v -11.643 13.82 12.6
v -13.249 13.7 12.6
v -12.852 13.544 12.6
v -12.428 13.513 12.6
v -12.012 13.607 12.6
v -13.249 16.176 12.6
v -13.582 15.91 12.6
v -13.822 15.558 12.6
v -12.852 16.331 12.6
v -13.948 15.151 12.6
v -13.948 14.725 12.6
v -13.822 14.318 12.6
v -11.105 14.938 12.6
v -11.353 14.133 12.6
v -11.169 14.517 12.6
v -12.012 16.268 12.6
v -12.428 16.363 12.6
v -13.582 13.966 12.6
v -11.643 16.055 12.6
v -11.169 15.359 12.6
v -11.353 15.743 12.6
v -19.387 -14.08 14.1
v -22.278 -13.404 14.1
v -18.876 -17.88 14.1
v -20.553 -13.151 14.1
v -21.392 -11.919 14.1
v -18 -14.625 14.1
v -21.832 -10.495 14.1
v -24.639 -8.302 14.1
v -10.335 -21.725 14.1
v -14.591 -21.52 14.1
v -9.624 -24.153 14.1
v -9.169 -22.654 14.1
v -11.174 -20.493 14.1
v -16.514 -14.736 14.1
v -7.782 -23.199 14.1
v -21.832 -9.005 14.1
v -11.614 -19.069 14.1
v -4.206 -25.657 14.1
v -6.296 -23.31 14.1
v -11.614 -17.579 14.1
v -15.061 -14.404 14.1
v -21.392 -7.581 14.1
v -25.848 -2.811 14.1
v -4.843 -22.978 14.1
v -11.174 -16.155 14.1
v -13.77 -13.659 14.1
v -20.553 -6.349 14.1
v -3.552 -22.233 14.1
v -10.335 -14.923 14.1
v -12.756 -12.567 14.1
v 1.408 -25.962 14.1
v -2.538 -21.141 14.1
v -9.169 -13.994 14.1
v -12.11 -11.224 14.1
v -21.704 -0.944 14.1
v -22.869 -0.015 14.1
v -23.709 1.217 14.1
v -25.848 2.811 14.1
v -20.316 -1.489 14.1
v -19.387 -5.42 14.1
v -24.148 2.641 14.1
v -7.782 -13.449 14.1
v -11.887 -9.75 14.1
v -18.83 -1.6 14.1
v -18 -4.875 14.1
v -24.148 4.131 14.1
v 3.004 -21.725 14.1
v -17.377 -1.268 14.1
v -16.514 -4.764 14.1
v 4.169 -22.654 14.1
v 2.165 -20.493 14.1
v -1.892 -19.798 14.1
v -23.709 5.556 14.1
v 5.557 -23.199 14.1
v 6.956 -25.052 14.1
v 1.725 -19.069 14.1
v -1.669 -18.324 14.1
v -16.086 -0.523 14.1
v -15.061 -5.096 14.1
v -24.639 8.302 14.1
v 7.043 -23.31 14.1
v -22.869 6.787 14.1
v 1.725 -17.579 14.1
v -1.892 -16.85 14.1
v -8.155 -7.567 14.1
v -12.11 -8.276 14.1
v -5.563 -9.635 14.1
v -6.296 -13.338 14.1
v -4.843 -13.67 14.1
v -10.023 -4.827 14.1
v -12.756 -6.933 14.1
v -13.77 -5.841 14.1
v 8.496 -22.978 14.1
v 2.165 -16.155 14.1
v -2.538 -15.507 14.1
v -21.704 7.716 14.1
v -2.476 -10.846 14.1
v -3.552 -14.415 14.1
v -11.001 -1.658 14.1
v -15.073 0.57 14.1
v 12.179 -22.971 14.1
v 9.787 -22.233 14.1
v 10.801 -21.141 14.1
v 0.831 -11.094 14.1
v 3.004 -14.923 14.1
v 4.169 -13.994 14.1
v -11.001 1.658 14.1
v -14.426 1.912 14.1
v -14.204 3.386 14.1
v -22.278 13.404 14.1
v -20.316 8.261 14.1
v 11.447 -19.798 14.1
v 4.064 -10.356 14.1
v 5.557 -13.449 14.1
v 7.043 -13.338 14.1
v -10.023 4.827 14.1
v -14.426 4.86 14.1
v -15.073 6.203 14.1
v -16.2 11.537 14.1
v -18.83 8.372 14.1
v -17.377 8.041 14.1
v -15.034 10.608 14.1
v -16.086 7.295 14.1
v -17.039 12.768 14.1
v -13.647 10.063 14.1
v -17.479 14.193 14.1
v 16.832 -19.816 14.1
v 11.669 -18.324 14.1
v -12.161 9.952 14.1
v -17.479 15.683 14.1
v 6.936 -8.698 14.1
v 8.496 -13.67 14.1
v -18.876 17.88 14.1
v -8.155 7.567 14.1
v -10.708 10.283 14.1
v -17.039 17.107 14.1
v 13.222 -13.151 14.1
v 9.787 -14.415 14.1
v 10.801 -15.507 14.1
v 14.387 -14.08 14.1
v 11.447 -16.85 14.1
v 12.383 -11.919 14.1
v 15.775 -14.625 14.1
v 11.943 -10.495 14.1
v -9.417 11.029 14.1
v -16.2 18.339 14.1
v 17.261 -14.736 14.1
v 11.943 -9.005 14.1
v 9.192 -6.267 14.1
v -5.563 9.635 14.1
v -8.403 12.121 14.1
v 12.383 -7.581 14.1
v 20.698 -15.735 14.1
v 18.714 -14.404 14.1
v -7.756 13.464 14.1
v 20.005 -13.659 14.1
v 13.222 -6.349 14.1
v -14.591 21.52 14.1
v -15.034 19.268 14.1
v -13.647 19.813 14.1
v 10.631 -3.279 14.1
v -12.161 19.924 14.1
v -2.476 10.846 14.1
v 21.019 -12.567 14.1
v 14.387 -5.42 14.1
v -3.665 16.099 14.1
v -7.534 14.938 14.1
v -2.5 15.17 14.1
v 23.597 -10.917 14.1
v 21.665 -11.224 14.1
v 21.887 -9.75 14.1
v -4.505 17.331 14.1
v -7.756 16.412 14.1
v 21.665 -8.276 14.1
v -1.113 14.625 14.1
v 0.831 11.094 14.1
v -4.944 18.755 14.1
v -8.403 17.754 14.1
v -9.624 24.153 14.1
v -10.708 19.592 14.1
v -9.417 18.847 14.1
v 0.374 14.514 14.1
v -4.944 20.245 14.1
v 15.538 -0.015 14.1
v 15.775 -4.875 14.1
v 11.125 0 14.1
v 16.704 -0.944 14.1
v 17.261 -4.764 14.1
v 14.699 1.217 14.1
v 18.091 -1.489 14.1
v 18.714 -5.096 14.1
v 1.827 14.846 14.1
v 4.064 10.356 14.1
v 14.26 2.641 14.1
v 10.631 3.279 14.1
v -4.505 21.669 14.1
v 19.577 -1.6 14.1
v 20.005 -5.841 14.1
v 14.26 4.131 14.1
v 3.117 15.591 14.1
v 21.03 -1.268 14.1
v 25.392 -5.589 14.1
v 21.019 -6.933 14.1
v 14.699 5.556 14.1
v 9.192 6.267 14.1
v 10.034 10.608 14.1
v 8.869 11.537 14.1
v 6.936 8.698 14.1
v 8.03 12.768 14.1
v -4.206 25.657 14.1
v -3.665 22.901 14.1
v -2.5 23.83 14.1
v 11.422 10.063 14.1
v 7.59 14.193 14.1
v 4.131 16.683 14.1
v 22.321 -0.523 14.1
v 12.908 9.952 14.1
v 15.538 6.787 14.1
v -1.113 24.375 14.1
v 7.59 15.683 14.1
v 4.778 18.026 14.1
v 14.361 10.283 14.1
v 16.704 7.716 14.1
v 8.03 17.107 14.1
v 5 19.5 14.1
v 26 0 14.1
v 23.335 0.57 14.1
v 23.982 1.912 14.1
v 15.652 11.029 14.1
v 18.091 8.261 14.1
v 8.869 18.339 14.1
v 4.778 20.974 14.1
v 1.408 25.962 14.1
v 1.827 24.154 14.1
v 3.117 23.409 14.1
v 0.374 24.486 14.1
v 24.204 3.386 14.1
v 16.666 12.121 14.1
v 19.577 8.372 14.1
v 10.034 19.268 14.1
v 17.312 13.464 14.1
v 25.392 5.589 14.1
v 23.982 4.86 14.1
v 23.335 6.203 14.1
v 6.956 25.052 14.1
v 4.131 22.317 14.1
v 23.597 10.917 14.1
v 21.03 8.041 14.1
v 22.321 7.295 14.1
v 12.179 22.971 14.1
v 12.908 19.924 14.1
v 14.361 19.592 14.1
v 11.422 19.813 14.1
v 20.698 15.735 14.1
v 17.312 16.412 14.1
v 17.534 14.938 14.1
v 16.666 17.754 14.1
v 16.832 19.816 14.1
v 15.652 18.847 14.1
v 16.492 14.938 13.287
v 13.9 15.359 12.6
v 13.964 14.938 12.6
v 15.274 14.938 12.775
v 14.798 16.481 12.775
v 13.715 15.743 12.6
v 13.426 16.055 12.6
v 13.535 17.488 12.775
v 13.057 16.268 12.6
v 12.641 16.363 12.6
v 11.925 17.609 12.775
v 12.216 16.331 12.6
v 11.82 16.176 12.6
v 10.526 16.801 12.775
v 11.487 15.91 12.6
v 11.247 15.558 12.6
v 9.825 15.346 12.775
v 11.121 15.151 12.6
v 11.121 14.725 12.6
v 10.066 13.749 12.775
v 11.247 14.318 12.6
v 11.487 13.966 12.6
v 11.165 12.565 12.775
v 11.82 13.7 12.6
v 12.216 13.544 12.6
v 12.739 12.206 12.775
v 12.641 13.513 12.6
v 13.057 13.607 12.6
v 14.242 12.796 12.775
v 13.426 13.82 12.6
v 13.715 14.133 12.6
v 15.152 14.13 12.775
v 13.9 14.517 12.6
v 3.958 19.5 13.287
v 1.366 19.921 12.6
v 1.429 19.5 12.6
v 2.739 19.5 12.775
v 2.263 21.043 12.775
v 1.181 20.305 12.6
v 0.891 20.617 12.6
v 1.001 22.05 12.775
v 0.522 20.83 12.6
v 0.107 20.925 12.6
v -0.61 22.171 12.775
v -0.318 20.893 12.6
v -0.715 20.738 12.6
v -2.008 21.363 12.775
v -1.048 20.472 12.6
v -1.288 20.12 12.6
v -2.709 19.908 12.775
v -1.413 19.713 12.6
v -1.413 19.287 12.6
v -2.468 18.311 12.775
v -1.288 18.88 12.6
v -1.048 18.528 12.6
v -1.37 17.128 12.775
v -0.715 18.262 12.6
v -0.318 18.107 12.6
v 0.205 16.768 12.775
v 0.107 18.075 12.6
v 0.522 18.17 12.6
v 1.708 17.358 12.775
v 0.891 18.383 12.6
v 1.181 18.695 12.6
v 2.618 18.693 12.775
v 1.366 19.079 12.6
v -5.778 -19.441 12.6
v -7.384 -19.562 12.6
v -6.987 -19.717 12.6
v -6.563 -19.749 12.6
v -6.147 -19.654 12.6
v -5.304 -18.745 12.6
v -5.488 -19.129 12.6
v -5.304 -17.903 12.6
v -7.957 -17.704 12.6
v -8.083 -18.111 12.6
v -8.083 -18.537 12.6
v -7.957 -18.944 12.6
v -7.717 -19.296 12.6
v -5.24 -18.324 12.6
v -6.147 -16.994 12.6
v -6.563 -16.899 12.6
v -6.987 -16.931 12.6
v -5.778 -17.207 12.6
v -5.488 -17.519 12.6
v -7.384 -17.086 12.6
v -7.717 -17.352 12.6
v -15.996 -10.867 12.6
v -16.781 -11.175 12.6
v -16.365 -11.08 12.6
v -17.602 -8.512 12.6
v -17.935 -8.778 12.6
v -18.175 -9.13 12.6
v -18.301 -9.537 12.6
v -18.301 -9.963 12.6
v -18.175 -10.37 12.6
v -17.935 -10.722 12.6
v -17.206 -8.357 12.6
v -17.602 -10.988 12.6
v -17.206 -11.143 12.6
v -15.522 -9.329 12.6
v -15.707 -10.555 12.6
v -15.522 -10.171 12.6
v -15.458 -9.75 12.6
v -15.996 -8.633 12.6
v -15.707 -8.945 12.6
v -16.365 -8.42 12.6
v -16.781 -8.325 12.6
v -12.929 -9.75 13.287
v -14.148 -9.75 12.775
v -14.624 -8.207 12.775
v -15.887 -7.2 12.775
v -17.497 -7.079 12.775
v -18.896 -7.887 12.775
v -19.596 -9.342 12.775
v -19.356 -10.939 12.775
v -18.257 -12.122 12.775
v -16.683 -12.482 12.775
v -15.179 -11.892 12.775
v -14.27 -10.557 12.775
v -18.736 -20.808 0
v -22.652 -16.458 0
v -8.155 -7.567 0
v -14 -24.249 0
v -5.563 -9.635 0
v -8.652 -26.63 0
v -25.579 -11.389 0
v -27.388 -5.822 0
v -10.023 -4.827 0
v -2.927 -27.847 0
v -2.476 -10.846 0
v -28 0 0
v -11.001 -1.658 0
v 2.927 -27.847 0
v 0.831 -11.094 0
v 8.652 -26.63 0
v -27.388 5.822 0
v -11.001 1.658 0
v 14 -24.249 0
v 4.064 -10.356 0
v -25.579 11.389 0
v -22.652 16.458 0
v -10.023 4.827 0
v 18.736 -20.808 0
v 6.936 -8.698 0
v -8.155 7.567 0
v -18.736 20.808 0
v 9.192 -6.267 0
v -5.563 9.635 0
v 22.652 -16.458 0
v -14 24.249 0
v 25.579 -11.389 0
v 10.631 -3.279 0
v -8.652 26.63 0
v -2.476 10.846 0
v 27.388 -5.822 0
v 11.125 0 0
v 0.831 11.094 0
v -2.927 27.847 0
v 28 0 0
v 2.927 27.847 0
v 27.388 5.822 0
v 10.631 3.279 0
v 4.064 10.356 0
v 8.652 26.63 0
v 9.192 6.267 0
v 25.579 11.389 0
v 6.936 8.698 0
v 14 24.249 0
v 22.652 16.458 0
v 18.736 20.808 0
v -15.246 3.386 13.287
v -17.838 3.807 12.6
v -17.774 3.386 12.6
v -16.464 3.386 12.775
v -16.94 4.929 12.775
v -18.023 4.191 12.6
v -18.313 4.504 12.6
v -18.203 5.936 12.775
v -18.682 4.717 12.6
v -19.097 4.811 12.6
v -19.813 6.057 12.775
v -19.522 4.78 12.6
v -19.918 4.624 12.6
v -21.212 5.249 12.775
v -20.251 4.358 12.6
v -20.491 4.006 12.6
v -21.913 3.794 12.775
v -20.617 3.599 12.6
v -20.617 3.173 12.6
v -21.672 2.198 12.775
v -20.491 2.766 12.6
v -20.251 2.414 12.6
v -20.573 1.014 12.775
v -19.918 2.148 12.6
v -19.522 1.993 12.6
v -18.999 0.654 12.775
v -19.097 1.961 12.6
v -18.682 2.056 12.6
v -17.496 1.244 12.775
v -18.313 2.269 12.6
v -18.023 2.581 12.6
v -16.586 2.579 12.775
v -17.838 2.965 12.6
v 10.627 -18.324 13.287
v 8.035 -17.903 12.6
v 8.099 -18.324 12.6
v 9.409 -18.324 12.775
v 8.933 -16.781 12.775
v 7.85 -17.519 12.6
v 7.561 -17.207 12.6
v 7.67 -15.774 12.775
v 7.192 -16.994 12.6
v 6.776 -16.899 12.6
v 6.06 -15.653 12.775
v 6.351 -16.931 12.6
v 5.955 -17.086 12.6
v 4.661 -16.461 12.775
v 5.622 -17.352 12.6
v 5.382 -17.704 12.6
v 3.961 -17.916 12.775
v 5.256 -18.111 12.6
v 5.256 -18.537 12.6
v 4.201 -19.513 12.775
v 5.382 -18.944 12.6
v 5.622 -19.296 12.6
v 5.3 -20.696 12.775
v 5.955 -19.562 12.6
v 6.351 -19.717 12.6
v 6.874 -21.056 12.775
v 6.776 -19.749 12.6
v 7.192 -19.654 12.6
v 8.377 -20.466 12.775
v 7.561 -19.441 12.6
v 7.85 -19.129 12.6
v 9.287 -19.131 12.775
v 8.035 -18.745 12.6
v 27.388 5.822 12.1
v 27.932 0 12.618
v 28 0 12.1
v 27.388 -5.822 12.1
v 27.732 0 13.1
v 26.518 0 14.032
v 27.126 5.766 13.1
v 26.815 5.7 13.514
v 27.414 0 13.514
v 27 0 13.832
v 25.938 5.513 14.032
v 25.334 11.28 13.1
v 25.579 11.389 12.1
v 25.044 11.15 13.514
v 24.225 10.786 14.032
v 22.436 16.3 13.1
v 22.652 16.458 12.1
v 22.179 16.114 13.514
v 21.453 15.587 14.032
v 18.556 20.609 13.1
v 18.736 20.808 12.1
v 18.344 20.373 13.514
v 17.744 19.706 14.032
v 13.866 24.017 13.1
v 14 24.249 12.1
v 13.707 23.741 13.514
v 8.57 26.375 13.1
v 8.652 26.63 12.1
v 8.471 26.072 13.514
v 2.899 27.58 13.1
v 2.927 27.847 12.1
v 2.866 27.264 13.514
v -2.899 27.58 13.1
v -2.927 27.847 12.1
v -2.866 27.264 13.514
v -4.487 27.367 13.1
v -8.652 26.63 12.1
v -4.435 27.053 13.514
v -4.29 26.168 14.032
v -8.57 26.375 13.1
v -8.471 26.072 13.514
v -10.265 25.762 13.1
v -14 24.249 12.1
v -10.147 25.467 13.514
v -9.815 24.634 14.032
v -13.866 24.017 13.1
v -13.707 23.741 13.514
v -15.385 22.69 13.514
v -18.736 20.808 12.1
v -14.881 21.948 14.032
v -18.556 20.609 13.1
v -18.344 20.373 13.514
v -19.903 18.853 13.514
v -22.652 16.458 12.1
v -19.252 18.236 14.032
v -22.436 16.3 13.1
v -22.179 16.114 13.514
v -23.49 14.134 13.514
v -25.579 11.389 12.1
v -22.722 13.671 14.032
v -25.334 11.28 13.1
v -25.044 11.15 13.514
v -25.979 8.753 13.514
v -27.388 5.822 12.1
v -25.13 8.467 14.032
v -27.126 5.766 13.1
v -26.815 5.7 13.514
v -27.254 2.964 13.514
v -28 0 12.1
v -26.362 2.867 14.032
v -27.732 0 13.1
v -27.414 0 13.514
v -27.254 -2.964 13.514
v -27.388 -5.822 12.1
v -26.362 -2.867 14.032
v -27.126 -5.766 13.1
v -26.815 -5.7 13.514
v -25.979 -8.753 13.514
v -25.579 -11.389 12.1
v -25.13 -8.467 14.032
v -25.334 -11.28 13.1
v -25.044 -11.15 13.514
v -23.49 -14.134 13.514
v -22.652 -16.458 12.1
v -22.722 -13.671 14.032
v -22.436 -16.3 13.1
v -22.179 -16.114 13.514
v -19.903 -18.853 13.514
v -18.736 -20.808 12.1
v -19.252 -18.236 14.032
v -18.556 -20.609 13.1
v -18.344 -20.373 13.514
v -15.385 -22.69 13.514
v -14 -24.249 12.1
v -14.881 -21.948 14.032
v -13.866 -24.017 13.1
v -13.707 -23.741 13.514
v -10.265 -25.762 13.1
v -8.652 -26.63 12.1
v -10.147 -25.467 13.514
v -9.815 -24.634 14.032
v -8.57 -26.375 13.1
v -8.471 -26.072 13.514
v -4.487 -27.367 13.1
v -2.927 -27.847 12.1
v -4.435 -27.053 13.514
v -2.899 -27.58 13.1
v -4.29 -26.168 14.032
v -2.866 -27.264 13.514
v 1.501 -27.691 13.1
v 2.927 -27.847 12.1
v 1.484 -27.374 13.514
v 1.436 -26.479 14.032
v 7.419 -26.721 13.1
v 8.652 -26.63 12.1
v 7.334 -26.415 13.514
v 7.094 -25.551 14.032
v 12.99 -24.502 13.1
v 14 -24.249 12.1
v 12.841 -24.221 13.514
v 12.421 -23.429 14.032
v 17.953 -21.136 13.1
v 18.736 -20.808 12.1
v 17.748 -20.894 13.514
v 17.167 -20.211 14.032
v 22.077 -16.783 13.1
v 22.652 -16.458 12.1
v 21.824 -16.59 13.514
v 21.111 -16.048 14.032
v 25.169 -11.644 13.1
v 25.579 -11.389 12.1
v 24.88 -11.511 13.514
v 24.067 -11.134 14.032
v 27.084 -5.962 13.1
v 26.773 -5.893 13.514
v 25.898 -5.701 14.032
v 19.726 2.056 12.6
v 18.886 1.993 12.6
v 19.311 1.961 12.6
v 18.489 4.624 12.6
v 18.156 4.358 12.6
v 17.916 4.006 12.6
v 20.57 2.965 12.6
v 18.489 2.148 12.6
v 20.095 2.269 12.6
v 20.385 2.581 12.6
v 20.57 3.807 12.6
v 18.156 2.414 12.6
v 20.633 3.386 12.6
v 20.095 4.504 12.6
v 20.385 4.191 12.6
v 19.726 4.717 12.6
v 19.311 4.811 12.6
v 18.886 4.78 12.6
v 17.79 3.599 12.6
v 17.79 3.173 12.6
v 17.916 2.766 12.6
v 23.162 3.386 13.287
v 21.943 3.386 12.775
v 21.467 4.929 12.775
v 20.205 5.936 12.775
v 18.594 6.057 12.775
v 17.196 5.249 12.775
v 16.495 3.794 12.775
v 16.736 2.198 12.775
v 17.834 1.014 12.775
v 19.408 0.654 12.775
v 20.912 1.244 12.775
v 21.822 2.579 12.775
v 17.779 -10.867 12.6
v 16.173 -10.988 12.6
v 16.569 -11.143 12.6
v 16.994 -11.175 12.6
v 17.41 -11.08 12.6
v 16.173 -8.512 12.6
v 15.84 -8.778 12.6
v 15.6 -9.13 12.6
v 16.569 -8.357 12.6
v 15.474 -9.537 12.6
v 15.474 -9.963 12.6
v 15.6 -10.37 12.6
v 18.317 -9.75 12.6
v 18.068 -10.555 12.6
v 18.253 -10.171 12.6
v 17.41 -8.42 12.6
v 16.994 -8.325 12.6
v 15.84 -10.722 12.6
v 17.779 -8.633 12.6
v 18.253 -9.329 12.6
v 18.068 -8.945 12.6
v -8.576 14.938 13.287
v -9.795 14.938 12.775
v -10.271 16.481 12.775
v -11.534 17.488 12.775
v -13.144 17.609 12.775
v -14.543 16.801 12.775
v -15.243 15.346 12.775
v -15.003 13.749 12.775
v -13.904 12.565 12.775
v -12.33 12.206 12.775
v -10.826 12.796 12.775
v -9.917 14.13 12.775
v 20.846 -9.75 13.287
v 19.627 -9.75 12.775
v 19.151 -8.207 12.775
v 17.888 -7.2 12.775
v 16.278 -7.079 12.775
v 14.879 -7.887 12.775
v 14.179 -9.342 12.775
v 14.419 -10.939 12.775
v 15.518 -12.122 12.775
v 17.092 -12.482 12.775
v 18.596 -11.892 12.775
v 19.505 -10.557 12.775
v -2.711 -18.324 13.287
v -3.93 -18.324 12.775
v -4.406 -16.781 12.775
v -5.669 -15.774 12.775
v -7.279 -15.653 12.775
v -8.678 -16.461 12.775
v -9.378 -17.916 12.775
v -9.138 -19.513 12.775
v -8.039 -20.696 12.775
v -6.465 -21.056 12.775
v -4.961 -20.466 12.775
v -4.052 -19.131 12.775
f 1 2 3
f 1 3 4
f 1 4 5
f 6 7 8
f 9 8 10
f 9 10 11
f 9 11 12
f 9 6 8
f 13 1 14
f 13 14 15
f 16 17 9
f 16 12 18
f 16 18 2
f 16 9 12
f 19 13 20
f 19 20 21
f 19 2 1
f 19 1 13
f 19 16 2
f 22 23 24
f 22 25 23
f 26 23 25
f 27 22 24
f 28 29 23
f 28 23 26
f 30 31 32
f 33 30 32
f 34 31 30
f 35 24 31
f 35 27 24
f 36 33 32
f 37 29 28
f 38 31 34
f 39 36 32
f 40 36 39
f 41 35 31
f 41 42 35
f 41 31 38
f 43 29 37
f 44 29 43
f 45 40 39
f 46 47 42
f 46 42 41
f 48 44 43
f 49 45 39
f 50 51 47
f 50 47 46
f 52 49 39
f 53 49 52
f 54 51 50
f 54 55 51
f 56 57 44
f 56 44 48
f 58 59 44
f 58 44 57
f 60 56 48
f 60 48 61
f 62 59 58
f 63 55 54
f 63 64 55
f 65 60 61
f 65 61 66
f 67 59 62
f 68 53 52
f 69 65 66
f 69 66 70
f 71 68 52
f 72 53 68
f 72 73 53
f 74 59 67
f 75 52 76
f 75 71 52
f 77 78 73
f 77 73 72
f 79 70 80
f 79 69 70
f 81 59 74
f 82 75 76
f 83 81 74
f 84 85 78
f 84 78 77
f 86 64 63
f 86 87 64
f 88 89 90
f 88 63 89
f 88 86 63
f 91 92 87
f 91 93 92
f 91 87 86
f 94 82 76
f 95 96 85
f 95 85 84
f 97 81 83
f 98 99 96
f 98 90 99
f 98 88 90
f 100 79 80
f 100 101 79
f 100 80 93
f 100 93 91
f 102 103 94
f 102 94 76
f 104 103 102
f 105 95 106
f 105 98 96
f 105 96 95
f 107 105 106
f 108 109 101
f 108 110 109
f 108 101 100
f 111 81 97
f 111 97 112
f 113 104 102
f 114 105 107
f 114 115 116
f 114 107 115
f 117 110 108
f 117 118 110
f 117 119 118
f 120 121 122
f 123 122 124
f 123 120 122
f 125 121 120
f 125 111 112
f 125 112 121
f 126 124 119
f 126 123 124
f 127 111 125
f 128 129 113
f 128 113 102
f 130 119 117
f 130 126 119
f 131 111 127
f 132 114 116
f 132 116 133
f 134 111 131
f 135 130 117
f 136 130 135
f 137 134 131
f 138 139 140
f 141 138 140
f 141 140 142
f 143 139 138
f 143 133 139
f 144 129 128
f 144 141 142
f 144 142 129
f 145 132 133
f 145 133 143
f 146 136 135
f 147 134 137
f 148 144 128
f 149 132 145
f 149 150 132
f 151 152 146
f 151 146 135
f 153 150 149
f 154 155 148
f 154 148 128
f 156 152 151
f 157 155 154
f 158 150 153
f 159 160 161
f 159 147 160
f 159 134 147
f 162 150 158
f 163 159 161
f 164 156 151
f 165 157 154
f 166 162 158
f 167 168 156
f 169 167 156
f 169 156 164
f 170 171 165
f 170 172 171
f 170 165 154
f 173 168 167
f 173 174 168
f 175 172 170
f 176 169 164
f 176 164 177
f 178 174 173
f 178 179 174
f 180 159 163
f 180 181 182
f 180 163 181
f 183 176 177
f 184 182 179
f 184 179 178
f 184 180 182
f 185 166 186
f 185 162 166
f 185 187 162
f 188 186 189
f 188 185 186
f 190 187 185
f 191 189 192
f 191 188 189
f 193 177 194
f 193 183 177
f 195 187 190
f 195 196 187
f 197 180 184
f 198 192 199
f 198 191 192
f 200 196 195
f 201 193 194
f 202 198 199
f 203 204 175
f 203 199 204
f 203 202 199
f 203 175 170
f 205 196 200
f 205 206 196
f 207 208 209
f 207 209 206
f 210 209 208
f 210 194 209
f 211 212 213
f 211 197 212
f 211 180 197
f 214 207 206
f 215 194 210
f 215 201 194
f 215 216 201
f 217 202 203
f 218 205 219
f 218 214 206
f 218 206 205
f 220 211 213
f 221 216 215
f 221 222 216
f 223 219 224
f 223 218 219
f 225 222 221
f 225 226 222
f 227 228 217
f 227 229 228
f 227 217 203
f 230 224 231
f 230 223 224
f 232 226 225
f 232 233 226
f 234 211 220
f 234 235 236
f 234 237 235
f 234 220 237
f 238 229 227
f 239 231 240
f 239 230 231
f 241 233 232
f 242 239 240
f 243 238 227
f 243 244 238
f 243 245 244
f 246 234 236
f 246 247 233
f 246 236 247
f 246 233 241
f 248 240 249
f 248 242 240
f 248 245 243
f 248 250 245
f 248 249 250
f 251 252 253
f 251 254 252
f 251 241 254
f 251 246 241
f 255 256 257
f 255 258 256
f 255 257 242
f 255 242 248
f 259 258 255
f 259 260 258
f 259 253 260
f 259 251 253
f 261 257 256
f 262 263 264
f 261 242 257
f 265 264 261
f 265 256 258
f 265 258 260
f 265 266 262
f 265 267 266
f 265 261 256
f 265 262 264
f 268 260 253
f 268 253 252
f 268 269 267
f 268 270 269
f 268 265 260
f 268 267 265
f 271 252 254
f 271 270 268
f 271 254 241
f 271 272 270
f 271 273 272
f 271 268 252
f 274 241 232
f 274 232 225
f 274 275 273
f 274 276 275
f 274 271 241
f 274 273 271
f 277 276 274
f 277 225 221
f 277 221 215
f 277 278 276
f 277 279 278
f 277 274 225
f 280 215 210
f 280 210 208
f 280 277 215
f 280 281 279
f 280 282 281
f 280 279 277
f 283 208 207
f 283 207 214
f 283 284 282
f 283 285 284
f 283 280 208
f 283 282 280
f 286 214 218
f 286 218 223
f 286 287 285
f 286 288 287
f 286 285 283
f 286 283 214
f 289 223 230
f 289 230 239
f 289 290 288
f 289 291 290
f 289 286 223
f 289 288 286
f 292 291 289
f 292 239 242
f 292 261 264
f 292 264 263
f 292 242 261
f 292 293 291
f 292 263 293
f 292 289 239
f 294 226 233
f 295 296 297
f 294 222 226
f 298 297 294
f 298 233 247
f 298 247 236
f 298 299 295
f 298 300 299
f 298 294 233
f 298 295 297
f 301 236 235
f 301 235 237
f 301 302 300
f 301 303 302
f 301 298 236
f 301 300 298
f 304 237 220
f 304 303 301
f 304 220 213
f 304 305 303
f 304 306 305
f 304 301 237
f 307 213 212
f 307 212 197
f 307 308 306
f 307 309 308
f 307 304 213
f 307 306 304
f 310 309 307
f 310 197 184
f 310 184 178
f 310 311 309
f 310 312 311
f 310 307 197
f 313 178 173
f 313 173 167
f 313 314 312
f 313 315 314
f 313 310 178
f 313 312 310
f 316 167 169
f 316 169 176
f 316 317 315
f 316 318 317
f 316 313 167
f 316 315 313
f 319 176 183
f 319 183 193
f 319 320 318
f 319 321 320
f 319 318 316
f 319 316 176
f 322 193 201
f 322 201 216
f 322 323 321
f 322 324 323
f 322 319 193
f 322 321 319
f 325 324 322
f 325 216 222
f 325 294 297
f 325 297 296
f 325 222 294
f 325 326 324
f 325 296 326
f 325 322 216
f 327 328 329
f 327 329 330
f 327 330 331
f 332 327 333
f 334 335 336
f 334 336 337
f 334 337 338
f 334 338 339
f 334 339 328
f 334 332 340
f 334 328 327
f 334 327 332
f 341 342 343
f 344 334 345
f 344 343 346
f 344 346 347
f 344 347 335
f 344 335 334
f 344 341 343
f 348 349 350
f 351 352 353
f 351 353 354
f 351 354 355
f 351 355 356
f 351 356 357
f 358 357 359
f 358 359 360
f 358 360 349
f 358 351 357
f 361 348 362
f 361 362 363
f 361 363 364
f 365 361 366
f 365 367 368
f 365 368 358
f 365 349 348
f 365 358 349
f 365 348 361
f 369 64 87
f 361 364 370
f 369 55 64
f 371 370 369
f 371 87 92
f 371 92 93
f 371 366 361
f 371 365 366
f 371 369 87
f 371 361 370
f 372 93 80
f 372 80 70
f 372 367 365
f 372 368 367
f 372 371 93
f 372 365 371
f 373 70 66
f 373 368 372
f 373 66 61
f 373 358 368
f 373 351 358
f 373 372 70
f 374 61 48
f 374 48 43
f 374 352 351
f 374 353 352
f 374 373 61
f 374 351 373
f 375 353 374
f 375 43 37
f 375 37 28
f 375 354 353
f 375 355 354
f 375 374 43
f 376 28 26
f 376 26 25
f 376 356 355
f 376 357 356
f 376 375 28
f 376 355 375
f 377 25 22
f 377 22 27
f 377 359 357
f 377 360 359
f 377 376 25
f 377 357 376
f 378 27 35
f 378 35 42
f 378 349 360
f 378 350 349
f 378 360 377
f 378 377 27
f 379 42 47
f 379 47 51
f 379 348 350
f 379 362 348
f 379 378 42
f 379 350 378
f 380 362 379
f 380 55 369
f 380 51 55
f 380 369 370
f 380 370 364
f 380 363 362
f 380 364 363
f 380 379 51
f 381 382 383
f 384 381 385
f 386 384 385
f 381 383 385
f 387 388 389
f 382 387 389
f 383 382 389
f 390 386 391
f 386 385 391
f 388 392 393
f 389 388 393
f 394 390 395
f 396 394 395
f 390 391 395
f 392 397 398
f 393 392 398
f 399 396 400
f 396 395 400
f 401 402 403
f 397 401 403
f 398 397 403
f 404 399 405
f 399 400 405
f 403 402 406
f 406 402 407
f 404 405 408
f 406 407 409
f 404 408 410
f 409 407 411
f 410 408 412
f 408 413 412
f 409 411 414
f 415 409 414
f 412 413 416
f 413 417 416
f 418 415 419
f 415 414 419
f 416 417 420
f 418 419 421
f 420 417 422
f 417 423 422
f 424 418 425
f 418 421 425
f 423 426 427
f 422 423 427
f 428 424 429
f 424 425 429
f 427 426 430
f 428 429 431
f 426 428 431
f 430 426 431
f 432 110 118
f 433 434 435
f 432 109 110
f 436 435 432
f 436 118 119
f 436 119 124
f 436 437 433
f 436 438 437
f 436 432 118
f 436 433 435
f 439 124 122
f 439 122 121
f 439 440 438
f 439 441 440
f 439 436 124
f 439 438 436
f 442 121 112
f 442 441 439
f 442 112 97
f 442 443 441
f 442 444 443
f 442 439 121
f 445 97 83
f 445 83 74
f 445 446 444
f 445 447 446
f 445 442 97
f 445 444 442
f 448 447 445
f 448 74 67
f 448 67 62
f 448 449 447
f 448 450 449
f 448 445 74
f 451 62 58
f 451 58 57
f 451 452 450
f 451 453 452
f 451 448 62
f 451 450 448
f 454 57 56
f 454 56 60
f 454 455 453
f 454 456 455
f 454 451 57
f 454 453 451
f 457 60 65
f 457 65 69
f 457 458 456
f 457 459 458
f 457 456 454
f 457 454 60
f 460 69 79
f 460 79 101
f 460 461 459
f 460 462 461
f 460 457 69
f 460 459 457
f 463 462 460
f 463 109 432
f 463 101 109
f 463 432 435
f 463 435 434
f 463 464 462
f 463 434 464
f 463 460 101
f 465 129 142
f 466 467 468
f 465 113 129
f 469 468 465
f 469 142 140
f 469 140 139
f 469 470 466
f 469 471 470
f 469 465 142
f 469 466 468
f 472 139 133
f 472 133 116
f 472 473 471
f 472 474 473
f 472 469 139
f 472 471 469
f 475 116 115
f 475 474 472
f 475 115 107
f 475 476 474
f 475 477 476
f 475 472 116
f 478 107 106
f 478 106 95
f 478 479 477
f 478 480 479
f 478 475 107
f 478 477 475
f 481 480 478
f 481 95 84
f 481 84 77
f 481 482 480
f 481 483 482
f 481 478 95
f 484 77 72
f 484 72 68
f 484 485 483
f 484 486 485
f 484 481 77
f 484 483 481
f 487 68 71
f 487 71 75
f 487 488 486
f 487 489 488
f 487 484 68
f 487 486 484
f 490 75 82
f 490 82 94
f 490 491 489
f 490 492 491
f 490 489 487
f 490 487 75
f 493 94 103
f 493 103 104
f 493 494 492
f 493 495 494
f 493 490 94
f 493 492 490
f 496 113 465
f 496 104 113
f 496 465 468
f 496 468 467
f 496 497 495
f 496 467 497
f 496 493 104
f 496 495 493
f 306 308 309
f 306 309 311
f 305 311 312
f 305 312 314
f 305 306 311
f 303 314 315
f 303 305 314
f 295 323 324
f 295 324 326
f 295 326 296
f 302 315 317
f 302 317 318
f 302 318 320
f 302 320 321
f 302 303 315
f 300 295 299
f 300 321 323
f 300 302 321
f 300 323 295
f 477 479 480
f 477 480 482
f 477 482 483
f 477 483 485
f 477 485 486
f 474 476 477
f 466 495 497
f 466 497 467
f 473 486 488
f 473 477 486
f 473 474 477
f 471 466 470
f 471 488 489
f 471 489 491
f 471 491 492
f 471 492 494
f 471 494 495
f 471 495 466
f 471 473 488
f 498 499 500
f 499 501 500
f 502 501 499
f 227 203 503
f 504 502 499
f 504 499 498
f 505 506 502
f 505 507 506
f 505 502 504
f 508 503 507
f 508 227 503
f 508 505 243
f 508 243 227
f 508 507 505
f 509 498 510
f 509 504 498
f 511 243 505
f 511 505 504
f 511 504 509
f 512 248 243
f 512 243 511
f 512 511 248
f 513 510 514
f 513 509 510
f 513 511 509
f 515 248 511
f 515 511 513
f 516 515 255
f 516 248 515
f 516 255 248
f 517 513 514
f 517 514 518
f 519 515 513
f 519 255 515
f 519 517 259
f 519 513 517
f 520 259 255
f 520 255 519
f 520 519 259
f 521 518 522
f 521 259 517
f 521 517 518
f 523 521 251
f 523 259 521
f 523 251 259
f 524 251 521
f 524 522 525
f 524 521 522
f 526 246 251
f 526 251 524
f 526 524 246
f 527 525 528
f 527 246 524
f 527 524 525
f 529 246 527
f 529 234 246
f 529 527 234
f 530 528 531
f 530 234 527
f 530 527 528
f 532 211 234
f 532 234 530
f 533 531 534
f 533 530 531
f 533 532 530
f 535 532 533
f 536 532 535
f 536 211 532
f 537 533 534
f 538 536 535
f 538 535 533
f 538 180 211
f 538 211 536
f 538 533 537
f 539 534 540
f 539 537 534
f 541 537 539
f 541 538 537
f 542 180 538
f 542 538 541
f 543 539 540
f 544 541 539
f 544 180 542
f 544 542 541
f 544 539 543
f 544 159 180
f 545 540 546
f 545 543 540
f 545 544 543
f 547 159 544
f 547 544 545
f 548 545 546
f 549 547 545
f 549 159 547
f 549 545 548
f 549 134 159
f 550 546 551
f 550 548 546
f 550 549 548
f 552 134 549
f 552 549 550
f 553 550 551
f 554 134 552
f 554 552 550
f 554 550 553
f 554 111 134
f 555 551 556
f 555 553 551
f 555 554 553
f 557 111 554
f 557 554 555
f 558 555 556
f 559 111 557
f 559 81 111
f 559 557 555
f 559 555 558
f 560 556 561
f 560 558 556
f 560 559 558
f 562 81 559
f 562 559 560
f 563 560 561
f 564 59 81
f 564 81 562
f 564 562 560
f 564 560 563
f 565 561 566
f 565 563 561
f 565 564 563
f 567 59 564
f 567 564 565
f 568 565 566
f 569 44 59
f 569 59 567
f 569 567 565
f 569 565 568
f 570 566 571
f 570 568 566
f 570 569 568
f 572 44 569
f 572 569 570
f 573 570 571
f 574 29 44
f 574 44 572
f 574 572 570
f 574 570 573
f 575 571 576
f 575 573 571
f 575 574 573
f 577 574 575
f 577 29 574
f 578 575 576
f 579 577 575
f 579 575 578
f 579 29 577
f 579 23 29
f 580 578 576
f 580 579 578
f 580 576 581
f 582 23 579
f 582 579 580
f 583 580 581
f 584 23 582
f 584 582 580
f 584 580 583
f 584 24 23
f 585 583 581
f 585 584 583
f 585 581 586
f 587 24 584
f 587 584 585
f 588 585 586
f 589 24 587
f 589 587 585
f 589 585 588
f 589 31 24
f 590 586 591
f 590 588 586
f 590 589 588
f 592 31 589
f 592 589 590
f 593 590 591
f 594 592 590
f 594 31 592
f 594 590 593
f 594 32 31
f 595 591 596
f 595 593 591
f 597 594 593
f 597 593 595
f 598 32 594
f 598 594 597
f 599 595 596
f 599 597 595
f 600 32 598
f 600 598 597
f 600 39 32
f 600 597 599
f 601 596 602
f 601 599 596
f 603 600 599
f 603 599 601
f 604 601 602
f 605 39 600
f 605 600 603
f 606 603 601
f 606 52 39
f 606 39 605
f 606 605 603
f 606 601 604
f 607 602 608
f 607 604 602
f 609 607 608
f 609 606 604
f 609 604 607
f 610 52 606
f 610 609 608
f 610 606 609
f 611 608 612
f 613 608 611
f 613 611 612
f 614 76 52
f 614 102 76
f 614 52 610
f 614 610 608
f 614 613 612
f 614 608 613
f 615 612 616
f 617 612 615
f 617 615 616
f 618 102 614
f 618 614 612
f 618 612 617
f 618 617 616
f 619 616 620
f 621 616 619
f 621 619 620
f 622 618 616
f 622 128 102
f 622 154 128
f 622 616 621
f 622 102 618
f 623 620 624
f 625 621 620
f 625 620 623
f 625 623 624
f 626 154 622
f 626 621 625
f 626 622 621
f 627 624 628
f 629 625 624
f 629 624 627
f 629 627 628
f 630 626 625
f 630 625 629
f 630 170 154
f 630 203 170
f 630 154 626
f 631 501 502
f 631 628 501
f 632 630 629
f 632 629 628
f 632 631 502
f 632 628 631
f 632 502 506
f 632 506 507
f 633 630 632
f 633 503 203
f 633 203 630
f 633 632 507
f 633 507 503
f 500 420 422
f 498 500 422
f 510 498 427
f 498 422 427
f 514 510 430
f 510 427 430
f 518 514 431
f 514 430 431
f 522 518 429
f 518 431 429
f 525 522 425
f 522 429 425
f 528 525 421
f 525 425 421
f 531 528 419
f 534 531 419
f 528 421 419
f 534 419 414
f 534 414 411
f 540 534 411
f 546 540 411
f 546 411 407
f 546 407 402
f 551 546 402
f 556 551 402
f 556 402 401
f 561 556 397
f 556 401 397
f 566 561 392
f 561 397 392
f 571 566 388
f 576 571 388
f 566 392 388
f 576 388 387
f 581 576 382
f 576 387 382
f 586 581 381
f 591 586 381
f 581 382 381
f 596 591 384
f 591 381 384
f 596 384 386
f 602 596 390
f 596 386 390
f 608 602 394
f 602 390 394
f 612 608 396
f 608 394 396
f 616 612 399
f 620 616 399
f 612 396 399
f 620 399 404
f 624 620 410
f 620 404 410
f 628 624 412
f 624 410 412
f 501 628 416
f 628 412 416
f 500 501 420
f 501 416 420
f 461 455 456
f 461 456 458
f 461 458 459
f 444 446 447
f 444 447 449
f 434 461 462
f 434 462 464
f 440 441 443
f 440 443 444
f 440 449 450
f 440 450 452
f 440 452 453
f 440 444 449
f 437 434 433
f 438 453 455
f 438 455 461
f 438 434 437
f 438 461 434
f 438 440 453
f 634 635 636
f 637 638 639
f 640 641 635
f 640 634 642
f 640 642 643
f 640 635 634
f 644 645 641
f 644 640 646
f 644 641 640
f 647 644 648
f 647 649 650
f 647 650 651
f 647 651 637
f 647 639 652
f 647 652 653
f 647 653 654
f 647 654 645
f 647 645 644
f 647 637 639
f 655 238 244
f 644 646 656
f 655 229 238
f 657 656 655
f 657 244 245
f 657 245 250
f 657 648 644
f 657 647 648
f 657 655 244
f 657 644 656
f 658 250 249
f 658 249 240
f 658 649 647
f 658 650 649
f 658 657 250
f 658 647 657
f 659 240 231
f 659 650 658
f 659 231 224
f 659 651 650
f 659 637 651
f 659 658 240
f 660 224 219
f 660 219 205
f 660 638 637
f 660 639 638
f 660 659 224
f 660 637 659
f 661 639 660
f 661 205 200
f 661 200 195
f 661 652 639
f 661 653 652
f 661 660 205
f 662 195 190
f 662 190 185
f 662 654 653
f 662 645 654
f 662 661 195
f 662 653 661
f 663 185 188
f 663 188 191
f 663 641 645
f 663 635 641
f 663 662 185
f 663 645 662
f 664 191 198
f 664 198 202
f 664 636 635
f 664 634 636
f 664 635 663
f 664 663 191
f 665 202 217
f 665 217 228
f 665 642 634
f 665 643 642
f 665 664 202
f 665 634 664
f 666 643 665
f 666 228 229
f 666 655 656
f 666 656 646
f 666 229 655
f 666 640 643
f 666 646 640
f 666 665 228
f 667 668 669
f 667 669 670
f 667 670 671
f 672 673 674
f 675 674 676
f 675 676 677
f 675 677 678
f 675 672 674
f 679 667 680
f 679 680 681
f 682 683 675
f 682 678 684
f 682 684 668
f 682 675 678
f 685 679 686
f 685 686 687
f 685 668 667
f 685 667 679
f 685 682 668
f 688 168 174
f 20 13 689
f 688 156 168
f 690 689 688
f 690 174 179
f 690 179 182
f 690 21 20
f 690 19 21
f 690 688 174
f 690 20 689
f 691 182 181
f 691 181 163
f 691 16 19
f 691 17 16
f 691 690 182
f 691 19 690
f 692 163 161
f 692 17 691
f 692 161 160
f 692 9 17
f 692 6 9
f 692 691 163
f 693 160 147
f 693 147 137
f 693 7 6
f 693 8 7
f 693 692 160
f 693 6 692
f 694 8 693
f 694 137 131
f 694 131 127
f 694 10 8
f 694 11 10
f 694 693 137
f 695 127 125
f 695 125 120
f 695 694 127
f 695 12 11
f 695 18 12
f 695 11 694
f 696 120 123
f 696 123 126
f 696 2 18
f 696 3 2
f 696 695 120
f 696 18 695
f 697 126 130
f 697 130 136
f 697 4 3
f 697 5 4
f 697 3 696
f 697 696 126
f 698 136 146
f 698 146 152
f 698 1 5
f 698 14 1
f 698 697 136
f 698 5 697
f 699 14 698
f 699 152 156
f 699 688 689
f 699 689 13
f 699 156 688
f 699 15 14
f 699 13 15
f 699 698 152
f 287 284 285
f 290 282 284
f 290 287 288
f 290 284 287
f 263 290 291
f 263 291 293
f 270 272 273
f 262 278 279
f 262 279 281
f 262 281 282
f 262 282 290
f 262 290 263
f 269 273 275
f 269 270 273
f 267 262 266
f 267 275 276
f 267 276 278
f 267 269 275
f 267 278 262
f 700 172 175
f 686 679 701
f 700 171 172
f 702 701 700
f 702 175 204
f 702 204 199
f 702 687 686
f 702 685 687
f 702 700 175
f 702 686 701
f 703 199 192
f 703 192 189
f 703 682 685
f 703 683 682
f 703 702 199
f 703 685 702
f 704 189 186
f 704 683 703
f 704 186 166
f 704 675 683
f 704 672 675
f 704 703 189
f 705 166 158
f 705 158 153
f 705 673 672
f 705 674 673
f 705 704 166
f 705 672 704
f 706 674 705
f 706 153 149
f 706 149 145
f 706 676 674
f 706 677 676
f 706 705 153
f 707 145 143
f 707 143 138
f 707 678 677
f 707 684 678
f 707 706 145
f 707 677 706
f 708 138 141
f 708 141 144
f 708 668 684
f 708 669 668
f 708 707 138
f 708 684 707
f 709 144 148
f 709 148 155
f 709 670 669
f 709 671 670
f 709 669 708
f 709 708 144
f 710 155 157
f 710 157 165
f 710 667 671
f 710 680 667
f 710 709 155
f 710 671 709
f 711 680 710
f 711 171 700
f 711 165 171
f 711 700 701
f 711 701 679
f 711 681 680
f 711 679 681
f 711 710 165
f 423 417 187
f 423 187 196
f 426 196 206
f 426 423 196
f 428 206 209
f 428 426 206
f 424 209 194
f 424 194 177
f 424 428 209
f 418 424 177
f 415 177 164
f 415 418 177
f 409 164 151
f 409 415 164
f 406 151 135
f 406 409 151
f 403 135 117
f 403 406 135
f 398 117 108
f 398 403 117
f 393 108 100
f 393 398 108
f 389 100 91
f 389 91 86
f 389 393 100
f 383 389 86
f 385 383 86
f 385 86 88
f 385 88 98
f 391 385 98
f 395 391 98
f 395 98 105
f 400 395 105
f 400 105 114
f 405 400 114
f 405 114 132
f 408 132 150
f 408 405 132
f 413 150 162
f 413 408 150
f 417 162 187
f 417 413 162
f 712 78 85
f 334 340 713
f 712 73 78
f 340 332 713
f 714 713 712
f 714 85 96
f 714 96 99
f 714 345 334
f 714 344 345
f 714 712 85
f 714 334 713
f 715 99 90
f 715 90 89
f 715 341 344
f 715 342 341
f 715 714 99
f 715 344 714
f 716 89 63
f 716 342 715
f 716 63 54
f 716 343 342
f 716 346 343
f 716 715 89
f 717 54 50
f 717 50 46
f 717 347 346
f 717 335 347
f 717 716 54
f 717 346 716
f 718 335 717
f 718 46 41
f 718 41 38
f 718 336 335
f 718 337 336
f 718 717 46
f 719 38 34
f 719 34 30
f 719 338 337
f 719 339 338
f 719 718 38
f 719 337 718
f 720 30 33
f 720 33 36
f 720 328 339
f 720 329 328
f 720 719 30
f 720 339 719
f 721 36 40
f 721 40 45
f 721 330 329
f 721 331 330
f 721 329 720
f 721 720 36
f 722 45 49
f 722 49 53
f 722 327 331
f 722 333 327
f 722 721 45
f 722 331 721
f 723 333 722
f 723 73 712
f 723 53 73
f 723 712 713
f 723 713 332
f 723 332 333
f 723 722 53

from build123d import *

# Parameters (mm, degrees)
F0_R     = 28
F0_R_2   = 11.125
F1_DEPTH = 14.1
F2_R     = 2
F3_R     = 5
F4_DEPTH = 1.5


# Not quite as in the source:
# - a fillet or chamfer that OpenCascade refuses, or shapes differently, is made with other operations: its cross-section is extruded or revolved along the edge and cut away or added


with BuildPart() as f1:
    # F0 (on Top) → F1 (new body)
    with BuildSketch(Plane.XY):
        Circle(F0_R)
        Circle(F0_R_2, mode=Mode.SUBTRACT)
    extrude(amount=F1_DEPTH)

    # F2
    f2_edges = [f1.edges().sort_by_distance(p)[0] for p in [
        (-28, 0, 14.1),
    ]]
    fillet(f2_edges, radius=F2_R)

    # F3 (on face) → F4 (cut)
    with BuildSketch(Plane.XY.offset(14.1)):
        with Locations((0, 19.5)):
            Circle(F3_R)
        with Locations((-12.5343583889, 14.9378666408)):
            Circle(F3_R)
        with Locations((-19.2037511837, 3.3861394645)):
            Circle(F3_R)
        with Locations((-16.8874953738, -9.75)):
            Circle(F3_R)
        with Locations((-6.6693927949, -18.3240061053)):
            Circle(F3_R)
        with Locations((6.6693927949, -18.3240061053)):
            Circle(F3_R)
        with Locations((16.8874953738, -9.75)):
            Circle(F3_R)
        with Locations((19.2037511837, 3.3861394645)):
            Circle(F3_R)
        with Locations((12.5343583889, 14.9378666408)):
            Circle(F3_R)
    extrude(amount=-F4_DEPTH, mode=Mode.SUBTRACT)

    # F5: fillet of radius 5 on 9 edges, made by hand

    # F5_s1 → F5_t2 (revolve)
    with BuildSketch(Plane.XZ.offset(-19.5)):
        with BuildLine():
            ThreePointArc((5, 14.1), (3.3657774588, 12.9902277714), (1.4292857857, 12.6))
            Line((1.4292857857, 12.6), (5, 12.6))
            Line((5, 12.6), (5, 14.1))
        make_face()
    revolve(axis=Axis((0, 19.5, 12.6), (0, 0, 1)))

    # F5_s3 → F5_t4 (revolve)
    with BuildSketch(Plane.XZ.offset(-14.9378666408)):
        with BuildLine():
            ThreePointArc((-7.5343583889, 14.1), (-9.1685809301, 12.9902277714), (-11.1050726032, 12.6))
            Line((-11.1050726032, 12.6), (-7.5343583889, 12.6))
            Line((-7.5343583889, 12.6), (-7.5343583889, 14.1))
        make_face()
    revolve(axis=Axis((-12.5343583889, 14.9378666408, 12.6), (0, 0, 1)))

    # F5_s5 → F5_t6 (revolve)
    with BuildSketch(Plane.XZ.offset(-3.3861394645)):
        with BuildLine():
            ThreePointArc((-14.2037511837, 14.1), (-15.8379737249, 12.9902277714), (-17.774465398, 12.6))
            Line((-17.774465398, 12.6), (-14.2037511837, 12.6))
            Line((-14.2037511837, 12.6), (-14.2037511837, 14.1))
        make_face()
    revolve(axis=Axis((-19.2037511837, 3.3861394645, 12.6), (0, 0, 1)))

    # F5_s7 → F5_t8 (revolve)
    with BuildSketch(Plane.XZ.offset(9.75)):
        with BuildLine():
            ThreePointArc((-11.8874953738, 14.1), (-13.521717915, 12.9902277714), (-15.4582095881, 12.6))
            Line((-15.4582095881, 12.6), (-11.8874953738, 12.6))
            Line((-11.8874953738, 12.6), (-11.8874953738, 14.1))
        make_face()
    revolve(axis=Axis((-16.8874953738, -9.75, 12.6), (0, 0, 1)))

    # F5_s9 → F5_t10 (revolve)
    with BuildSketch(Plane.XZ.offset(18.3240061053)):
        with BuildLine():
            ThreePointArc((-1.6693927949, 14.1), (-3.303615336, 12.9902277714), (-5.2401070091, 12.6))
            Line((-5.2401070091, 12.6), (-1.6693927949, 12.6))
            Line((-1.6693927949, 12.6), (-1.6693927949, 14.1))
        make_face()
    revolve(axis=Axis((-6.6693927949, -18.3240061053, 12.6), (0, 0, 1)))

    # F5_s11 → F5_t12 (revolve)
    with BuildSketch(Plane.XZ.offset(18.3240061053)):
        with BuildLine():
            ThreePointArc((11.6693927949, 14.1), (10.0351702537, 12.9902277714), (8.0986785806, 12.6))
            Line((8.0986785806, 12.6), (11.6693927949, 12.6))
            Line((11.6693927949, 12.6), (11.6693927949, 14.1))
        make_face()
    revolve(axis=Axis((6.6693927949, -18.3240061053, 12.6), (0, 0, 1)))

    # F5_s13 → F5_t14 (revolve)
    with BuildSketch(Plane.XZ.offset(9.75)):
        with BuildLine():
            ThreePointArc((21.8874953738, 14.1), (20.2532728326, 12.9902277714), (18.3167811595, 12.6))
            Line((18.3167811595, 12.6), (21.8874953738, 12.6))
            Line((21.8874953738, 12.6), (21.8874953738, 14.1))
        make_face()
    revolve(axis=Axis((16.8874953738, -9.75, 12.6), (0, 0, 1)))

    # F5_s15 → F5_t16 (revolve)
    with BuildSketch(Plane.XZ.offset(-3.3861394645)):
        with BuildLine():
            ThreePointArc((24.2037511837, 14.1), (22.5695286426, 12.9902277714), (20.6330369695, 12.6))
            Line((20.6330369695, 12.6), (24.2037511837, 12.6))
            Line((24.2037511837, 12.6), (24.2037511837, 14.1))
        make_face()
    revolve(axis=Axis((19.2037511837, 3.3861394645, 12.6), (0, 0, 1)))

    # F5_s17 → F5_t18 (revolve)
    with BuildSketch(Plane.XZ.offset(-14.9378666408)):
        with BuildLine():
            ThreePointArc((17.5343583889, 14.1), (15.9001358477, 12.9902277714), (13.9636441746, 12.6))
            Line((13.9636441746, 12.6), (17.5343583889, 12.6))
            Line((17.5343583889, 12.6), (17.5343583889, 14.1))
        make_face()
    revolve(axis=Axis((12.5343583889, 14.9378666408, 12.6), (0, 0, 1)))


solid = f1.part
